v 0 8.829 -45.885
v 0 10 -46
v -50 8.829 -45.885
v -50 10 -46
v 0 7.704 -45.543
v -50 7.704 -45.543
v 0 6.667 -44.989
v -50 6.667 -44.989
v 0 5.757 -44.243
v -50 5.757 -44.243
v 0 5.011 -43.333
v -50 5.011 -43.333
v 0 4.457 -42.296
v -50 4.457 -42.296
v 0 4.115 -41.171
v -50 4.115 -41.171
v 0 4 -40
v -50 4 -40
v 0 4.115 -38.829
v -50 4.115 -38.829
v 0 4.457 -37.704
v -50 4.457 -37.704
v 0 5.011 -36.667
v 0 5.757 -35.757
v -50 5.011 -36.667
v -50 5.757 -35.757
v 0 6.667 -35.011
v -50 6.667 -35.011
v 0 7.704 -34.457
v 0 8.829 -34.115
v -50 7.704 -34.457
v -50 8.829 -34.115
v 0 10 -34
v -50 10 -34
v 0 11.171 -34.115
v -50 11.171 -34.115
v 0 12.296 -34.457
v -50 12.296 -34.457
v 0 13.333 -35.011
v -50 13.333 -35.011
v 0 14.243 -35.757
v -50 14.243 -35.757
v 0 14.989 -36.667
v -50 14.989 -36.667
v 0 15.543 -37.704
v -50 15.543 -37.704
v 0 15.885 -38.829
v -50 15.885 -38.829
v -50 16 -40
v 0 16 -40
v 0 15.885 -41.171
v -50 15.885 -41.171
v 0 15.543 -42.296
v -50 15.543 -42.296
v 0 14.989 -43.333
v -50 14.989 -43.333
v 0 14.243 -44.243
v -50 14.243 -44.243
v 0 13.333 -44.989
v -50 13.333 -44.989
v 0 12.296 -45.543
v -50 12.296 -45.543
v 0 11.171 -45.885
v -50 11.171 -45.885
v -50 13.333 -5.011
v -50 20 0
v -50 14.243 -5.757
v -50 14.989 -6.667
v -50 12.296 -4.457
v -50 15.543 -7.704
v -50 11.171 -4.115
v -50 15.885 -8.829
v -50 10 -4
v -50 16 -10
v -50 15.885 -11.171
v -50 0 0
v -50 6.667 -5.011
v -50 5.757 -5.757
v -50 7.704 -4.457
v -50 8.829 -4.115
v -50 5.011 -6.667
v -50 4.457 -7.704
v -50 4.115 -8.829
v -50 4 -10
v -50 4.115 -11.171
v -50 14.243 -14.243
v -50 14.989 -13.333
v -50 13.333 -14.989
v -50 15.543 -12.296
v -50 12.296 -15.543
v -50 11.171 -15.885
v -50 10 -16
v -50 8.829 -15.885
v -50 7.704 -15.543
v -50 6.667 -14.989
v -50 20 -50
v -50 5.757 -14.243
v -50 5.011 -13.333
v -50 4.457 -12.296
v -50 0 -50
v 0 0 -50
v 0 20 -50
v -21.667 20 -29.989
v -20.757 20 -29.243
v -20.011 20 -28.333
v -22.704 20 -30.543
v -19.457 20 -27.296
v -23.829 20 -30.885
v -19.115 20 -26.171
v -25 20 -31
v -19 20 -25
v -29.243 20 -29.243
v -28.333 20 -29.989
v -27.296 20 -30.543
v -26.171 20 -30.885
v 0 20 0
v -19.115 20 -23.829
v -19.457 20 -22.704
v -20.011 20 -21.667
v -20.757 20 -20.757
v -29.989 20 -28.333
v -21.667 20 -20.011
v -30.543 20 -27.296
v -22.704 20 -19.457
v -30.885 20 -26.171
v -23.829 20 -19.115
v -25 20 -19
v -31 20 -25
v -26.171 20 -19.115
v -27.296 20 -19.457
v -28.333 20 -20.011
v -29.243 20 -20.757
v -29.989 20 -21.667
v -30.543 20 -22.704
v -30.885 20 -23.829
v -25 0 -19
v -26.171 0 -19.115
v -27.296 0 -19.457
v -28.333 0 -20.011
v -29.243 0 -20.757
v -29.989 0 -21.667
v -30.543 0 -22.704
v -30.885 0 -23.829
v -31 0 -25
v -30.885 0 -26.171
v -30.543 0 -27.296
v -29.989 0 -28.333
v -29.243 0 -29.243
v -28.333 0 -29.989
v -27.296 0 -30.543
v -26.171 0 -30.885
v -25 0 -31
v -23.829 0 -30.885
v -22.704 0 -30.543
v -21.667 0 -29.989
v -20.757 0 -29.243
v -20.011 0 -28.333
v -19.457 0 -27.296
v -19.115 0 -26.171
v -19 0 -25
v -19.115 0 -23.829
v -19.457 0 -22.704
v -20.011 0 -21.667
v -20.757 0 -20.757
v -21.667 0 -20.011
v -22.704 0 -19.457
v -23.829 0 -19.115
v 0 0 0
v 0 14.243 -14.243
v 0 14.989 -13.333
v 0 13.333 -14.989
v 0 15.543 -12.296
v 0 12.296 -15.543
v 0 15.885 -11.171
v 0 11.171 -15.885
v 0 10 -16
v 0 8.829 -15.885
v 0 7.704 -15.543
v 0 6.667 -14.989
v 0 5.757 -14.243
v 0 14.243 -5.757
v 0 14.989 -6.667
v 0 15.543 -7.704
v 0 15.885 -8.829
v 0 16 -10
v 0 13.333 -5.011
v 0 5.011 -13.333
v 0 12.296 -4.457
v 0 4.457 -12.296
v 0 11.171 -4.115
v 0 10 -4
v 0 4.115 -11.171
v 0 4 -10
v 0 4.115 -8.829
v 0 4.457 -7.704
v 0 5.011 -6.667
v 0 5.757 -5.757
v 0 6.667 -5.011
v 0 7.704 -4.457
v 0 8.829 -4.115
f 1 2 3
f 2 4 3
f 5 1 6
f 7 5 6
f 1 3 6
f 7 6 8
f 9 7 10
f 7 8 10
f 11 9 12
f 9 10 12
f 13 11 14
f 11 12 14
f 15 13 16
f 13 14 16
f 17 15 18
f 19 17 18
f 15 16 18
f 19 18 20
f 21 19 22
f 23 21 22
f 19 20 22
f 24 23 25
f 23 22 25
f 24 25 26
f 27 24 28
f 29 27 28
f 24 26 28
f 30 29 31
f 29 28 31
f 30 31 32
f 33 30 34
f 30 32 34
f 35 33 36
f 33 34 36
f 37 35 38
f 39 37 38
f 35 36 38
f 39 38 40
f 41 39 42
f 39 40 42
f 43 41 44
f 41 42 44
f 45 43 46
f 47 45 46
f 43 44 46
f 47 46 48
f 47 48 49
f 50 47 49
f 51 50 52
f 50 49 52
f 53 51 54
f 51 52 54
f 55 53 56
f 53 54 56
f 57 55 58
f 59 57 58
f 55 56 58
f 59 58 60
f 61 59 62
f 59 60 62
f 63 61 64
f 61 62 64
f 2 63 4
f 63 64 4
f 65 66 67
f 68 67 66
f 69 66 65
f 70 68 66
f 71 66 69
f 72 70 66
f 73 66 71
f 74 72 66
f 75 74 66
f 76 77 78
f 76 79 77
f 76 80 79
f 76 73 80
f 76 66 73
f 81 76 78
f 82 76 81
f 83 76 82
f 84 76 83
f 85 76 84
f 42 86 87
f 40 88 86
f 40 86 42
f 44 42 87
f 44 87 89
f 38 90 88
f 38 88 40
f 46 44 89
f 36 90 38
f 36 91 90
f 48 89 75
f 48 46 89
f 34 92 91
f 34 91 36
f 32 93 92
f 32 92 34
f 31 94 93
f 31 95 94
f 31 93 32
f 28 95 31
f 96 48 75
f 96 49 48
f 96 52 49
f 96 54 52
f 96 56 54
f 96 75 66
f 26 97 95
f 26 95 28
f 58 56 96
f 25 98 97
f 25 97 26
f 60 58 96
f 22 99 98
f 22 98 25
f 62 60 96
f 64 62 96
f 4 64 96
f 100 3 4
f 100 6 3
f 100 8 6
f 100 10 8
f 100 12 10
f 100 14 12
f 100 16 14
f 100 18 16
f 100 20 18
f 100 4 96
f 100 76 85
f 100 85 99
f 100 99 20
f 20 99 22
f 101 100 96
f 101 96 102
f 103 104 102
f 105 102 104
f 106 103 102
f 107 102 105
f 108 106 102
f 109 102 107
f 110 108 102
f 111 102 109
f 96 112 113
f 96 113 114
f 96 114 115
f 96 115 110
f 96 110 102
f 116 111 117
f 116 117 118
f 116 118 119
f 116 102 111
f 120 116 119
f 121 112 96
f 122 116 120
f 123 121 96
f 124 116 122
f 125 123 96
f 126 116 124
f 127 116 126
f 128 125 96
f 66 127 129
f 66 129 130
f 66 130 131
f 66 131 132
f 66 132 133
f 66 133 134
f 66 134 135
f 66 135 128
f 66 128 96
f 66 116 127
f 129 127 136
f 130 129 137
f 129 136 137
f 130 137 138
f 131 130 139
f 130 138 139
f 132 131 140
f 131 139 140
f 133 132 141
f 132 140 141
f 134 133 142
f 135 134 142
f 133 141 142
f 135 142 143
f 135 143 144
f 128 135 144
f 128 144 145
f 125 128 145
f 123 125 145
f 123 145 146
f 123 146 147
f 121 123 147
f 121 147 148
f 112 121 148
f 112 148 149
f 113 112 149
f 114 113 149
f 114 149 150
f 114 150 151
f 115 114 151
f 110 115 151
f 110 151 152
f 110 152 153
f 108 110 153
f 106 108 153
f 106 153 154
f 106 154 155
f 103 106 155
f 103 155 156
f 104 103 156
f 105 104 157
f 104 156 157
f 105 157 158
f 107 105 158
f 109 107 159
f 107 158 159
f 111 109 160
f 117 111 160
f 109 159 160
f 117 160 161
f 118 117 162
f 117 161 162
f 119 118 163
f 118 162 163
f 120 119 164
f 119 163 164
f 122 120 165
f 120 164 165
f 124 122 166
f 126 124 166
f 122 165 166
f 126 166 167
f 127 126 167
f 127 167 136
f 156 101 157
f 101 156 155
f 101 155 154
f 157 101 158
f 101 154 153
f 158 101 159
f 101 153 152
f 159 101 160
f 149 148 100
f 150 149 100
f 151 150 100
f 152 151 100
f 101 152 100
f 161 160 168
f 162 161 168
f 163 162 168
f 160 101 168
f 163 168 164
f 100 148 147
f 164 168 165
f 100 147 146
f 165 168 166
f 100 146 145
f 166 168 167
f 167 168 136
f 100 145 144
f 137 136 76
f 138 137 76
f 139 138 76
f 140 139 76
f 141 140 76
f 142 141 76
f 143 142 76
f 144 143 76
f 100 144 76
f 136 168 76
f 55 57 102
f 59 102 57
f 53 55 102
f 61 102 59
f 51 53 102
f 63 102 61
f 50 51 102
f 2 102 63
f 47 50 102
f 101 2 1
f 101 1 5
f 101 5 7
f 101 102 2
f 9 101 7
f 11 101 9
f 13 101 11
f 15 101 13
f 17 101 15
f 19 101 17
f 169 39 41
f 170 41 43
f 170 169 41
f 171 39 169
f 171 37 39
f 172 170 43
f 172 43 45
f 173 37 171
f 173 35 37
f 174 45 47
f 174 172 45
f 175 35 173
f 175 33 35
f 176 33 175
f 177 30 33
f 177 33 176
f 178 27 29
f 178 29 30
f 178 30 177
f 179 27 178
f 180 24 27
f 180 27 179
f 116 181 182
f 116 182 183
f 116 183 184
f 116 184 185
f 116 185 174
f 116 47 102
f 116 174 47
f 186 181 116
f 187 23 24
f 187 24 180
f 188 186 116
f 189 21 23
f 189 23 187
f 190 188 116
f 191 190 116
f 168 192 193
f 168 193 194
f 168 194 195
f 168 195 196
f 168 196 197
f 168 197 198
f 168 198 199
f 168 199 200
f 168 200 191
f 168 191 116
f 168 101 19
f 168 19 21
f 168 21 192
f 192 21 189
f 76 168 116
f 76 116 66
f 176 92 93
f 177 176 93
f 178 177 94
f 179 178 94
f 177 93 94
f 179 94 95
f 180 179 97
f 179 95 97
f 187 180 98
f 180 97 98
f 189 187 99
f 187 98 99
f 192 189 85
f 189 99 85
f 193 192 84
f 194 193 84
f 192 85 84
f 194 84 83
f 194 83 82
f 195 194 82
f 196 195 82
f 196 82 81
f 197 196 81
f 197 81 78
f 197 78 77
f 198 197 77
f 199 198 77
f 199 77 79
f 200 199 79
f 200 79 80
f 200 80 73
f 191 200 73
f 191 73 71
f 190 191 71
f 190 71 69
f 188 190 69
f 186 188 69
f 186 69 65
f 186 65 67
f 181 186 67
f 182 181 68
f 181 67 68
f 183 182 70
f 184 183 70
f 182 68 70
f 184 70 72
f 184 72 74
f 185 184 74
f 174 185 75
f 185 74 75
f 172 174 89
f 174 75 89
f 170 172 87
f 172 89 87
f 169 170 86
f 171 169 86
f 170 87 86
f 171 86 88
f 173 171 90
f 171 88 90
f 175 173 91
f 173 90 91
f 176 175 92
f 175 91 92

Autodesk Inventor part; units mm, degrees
ref_plane "YZ Plane" through (0, 0, 0) normal (1, 0, 0) x (0, 1, 0)
ref_plane "XZ Plane" through (0, 0, 0) normal (0, 1, 0) x (-1, 0, 0)
ref_plane "XY Plane" through (0, 0, 0) normal (0, 0, 1) x (1, 0, 0)
sketch "Sketch1" plane through (0, 0, 0) normal (0, 1, 0) x (-1, 0, 0)
  line L0 (0, 0) -> (50, 0)
  line L1 (50, 0) -> (50, -50)
  line L2 (50, -50) -> (0, -50)
  line L3 (0, -50) -> (0, 0)
  dimension "d0" = 50
  dimension "d1" = 50
extrude "Extrusion1" add sketch "Sketch1" along normal blind 20
sketch "Sketch2" plane through (0, 0, 0) normal (1, 0, 0) x (0, 0, -1)
  line L0 (0, 20) -> (50, 20) projected
  line L1 (0, 0) -> (0, 20) projected
  line L2 (50, 0) -> (50, 20) projected
  point P0 (10, 10)
  point P1 (40, 10)
  dimension "d4" = 10
  dimension "d5" = 10
  dimension "d6" = 10
  dimension "d7" = 10
hole "Hole1" at (0, 10, -10) at (0, 10, -40) direction (-1, 0, 0) diameter 12 depth 50 tip angle 118
sketch "Sketch3" plane through (0, 20, 0) normal (0, 1, 0) x (1, 0, 0)
  line L0 (-50, 0) -> (-50, 50) projected
  line L1 (0, 50) -> (-50, 50) projected
  point P0 (0, 0)
  point P1 (-25, 25)
  dimension "d15" = 25
  dimension "d16" = 25
hole "Hole2" at (-25, 20, -25) direction (0, -1, 0) diameter 12 depth 50 tip angle 118
properties part number "Extruder mount top"
